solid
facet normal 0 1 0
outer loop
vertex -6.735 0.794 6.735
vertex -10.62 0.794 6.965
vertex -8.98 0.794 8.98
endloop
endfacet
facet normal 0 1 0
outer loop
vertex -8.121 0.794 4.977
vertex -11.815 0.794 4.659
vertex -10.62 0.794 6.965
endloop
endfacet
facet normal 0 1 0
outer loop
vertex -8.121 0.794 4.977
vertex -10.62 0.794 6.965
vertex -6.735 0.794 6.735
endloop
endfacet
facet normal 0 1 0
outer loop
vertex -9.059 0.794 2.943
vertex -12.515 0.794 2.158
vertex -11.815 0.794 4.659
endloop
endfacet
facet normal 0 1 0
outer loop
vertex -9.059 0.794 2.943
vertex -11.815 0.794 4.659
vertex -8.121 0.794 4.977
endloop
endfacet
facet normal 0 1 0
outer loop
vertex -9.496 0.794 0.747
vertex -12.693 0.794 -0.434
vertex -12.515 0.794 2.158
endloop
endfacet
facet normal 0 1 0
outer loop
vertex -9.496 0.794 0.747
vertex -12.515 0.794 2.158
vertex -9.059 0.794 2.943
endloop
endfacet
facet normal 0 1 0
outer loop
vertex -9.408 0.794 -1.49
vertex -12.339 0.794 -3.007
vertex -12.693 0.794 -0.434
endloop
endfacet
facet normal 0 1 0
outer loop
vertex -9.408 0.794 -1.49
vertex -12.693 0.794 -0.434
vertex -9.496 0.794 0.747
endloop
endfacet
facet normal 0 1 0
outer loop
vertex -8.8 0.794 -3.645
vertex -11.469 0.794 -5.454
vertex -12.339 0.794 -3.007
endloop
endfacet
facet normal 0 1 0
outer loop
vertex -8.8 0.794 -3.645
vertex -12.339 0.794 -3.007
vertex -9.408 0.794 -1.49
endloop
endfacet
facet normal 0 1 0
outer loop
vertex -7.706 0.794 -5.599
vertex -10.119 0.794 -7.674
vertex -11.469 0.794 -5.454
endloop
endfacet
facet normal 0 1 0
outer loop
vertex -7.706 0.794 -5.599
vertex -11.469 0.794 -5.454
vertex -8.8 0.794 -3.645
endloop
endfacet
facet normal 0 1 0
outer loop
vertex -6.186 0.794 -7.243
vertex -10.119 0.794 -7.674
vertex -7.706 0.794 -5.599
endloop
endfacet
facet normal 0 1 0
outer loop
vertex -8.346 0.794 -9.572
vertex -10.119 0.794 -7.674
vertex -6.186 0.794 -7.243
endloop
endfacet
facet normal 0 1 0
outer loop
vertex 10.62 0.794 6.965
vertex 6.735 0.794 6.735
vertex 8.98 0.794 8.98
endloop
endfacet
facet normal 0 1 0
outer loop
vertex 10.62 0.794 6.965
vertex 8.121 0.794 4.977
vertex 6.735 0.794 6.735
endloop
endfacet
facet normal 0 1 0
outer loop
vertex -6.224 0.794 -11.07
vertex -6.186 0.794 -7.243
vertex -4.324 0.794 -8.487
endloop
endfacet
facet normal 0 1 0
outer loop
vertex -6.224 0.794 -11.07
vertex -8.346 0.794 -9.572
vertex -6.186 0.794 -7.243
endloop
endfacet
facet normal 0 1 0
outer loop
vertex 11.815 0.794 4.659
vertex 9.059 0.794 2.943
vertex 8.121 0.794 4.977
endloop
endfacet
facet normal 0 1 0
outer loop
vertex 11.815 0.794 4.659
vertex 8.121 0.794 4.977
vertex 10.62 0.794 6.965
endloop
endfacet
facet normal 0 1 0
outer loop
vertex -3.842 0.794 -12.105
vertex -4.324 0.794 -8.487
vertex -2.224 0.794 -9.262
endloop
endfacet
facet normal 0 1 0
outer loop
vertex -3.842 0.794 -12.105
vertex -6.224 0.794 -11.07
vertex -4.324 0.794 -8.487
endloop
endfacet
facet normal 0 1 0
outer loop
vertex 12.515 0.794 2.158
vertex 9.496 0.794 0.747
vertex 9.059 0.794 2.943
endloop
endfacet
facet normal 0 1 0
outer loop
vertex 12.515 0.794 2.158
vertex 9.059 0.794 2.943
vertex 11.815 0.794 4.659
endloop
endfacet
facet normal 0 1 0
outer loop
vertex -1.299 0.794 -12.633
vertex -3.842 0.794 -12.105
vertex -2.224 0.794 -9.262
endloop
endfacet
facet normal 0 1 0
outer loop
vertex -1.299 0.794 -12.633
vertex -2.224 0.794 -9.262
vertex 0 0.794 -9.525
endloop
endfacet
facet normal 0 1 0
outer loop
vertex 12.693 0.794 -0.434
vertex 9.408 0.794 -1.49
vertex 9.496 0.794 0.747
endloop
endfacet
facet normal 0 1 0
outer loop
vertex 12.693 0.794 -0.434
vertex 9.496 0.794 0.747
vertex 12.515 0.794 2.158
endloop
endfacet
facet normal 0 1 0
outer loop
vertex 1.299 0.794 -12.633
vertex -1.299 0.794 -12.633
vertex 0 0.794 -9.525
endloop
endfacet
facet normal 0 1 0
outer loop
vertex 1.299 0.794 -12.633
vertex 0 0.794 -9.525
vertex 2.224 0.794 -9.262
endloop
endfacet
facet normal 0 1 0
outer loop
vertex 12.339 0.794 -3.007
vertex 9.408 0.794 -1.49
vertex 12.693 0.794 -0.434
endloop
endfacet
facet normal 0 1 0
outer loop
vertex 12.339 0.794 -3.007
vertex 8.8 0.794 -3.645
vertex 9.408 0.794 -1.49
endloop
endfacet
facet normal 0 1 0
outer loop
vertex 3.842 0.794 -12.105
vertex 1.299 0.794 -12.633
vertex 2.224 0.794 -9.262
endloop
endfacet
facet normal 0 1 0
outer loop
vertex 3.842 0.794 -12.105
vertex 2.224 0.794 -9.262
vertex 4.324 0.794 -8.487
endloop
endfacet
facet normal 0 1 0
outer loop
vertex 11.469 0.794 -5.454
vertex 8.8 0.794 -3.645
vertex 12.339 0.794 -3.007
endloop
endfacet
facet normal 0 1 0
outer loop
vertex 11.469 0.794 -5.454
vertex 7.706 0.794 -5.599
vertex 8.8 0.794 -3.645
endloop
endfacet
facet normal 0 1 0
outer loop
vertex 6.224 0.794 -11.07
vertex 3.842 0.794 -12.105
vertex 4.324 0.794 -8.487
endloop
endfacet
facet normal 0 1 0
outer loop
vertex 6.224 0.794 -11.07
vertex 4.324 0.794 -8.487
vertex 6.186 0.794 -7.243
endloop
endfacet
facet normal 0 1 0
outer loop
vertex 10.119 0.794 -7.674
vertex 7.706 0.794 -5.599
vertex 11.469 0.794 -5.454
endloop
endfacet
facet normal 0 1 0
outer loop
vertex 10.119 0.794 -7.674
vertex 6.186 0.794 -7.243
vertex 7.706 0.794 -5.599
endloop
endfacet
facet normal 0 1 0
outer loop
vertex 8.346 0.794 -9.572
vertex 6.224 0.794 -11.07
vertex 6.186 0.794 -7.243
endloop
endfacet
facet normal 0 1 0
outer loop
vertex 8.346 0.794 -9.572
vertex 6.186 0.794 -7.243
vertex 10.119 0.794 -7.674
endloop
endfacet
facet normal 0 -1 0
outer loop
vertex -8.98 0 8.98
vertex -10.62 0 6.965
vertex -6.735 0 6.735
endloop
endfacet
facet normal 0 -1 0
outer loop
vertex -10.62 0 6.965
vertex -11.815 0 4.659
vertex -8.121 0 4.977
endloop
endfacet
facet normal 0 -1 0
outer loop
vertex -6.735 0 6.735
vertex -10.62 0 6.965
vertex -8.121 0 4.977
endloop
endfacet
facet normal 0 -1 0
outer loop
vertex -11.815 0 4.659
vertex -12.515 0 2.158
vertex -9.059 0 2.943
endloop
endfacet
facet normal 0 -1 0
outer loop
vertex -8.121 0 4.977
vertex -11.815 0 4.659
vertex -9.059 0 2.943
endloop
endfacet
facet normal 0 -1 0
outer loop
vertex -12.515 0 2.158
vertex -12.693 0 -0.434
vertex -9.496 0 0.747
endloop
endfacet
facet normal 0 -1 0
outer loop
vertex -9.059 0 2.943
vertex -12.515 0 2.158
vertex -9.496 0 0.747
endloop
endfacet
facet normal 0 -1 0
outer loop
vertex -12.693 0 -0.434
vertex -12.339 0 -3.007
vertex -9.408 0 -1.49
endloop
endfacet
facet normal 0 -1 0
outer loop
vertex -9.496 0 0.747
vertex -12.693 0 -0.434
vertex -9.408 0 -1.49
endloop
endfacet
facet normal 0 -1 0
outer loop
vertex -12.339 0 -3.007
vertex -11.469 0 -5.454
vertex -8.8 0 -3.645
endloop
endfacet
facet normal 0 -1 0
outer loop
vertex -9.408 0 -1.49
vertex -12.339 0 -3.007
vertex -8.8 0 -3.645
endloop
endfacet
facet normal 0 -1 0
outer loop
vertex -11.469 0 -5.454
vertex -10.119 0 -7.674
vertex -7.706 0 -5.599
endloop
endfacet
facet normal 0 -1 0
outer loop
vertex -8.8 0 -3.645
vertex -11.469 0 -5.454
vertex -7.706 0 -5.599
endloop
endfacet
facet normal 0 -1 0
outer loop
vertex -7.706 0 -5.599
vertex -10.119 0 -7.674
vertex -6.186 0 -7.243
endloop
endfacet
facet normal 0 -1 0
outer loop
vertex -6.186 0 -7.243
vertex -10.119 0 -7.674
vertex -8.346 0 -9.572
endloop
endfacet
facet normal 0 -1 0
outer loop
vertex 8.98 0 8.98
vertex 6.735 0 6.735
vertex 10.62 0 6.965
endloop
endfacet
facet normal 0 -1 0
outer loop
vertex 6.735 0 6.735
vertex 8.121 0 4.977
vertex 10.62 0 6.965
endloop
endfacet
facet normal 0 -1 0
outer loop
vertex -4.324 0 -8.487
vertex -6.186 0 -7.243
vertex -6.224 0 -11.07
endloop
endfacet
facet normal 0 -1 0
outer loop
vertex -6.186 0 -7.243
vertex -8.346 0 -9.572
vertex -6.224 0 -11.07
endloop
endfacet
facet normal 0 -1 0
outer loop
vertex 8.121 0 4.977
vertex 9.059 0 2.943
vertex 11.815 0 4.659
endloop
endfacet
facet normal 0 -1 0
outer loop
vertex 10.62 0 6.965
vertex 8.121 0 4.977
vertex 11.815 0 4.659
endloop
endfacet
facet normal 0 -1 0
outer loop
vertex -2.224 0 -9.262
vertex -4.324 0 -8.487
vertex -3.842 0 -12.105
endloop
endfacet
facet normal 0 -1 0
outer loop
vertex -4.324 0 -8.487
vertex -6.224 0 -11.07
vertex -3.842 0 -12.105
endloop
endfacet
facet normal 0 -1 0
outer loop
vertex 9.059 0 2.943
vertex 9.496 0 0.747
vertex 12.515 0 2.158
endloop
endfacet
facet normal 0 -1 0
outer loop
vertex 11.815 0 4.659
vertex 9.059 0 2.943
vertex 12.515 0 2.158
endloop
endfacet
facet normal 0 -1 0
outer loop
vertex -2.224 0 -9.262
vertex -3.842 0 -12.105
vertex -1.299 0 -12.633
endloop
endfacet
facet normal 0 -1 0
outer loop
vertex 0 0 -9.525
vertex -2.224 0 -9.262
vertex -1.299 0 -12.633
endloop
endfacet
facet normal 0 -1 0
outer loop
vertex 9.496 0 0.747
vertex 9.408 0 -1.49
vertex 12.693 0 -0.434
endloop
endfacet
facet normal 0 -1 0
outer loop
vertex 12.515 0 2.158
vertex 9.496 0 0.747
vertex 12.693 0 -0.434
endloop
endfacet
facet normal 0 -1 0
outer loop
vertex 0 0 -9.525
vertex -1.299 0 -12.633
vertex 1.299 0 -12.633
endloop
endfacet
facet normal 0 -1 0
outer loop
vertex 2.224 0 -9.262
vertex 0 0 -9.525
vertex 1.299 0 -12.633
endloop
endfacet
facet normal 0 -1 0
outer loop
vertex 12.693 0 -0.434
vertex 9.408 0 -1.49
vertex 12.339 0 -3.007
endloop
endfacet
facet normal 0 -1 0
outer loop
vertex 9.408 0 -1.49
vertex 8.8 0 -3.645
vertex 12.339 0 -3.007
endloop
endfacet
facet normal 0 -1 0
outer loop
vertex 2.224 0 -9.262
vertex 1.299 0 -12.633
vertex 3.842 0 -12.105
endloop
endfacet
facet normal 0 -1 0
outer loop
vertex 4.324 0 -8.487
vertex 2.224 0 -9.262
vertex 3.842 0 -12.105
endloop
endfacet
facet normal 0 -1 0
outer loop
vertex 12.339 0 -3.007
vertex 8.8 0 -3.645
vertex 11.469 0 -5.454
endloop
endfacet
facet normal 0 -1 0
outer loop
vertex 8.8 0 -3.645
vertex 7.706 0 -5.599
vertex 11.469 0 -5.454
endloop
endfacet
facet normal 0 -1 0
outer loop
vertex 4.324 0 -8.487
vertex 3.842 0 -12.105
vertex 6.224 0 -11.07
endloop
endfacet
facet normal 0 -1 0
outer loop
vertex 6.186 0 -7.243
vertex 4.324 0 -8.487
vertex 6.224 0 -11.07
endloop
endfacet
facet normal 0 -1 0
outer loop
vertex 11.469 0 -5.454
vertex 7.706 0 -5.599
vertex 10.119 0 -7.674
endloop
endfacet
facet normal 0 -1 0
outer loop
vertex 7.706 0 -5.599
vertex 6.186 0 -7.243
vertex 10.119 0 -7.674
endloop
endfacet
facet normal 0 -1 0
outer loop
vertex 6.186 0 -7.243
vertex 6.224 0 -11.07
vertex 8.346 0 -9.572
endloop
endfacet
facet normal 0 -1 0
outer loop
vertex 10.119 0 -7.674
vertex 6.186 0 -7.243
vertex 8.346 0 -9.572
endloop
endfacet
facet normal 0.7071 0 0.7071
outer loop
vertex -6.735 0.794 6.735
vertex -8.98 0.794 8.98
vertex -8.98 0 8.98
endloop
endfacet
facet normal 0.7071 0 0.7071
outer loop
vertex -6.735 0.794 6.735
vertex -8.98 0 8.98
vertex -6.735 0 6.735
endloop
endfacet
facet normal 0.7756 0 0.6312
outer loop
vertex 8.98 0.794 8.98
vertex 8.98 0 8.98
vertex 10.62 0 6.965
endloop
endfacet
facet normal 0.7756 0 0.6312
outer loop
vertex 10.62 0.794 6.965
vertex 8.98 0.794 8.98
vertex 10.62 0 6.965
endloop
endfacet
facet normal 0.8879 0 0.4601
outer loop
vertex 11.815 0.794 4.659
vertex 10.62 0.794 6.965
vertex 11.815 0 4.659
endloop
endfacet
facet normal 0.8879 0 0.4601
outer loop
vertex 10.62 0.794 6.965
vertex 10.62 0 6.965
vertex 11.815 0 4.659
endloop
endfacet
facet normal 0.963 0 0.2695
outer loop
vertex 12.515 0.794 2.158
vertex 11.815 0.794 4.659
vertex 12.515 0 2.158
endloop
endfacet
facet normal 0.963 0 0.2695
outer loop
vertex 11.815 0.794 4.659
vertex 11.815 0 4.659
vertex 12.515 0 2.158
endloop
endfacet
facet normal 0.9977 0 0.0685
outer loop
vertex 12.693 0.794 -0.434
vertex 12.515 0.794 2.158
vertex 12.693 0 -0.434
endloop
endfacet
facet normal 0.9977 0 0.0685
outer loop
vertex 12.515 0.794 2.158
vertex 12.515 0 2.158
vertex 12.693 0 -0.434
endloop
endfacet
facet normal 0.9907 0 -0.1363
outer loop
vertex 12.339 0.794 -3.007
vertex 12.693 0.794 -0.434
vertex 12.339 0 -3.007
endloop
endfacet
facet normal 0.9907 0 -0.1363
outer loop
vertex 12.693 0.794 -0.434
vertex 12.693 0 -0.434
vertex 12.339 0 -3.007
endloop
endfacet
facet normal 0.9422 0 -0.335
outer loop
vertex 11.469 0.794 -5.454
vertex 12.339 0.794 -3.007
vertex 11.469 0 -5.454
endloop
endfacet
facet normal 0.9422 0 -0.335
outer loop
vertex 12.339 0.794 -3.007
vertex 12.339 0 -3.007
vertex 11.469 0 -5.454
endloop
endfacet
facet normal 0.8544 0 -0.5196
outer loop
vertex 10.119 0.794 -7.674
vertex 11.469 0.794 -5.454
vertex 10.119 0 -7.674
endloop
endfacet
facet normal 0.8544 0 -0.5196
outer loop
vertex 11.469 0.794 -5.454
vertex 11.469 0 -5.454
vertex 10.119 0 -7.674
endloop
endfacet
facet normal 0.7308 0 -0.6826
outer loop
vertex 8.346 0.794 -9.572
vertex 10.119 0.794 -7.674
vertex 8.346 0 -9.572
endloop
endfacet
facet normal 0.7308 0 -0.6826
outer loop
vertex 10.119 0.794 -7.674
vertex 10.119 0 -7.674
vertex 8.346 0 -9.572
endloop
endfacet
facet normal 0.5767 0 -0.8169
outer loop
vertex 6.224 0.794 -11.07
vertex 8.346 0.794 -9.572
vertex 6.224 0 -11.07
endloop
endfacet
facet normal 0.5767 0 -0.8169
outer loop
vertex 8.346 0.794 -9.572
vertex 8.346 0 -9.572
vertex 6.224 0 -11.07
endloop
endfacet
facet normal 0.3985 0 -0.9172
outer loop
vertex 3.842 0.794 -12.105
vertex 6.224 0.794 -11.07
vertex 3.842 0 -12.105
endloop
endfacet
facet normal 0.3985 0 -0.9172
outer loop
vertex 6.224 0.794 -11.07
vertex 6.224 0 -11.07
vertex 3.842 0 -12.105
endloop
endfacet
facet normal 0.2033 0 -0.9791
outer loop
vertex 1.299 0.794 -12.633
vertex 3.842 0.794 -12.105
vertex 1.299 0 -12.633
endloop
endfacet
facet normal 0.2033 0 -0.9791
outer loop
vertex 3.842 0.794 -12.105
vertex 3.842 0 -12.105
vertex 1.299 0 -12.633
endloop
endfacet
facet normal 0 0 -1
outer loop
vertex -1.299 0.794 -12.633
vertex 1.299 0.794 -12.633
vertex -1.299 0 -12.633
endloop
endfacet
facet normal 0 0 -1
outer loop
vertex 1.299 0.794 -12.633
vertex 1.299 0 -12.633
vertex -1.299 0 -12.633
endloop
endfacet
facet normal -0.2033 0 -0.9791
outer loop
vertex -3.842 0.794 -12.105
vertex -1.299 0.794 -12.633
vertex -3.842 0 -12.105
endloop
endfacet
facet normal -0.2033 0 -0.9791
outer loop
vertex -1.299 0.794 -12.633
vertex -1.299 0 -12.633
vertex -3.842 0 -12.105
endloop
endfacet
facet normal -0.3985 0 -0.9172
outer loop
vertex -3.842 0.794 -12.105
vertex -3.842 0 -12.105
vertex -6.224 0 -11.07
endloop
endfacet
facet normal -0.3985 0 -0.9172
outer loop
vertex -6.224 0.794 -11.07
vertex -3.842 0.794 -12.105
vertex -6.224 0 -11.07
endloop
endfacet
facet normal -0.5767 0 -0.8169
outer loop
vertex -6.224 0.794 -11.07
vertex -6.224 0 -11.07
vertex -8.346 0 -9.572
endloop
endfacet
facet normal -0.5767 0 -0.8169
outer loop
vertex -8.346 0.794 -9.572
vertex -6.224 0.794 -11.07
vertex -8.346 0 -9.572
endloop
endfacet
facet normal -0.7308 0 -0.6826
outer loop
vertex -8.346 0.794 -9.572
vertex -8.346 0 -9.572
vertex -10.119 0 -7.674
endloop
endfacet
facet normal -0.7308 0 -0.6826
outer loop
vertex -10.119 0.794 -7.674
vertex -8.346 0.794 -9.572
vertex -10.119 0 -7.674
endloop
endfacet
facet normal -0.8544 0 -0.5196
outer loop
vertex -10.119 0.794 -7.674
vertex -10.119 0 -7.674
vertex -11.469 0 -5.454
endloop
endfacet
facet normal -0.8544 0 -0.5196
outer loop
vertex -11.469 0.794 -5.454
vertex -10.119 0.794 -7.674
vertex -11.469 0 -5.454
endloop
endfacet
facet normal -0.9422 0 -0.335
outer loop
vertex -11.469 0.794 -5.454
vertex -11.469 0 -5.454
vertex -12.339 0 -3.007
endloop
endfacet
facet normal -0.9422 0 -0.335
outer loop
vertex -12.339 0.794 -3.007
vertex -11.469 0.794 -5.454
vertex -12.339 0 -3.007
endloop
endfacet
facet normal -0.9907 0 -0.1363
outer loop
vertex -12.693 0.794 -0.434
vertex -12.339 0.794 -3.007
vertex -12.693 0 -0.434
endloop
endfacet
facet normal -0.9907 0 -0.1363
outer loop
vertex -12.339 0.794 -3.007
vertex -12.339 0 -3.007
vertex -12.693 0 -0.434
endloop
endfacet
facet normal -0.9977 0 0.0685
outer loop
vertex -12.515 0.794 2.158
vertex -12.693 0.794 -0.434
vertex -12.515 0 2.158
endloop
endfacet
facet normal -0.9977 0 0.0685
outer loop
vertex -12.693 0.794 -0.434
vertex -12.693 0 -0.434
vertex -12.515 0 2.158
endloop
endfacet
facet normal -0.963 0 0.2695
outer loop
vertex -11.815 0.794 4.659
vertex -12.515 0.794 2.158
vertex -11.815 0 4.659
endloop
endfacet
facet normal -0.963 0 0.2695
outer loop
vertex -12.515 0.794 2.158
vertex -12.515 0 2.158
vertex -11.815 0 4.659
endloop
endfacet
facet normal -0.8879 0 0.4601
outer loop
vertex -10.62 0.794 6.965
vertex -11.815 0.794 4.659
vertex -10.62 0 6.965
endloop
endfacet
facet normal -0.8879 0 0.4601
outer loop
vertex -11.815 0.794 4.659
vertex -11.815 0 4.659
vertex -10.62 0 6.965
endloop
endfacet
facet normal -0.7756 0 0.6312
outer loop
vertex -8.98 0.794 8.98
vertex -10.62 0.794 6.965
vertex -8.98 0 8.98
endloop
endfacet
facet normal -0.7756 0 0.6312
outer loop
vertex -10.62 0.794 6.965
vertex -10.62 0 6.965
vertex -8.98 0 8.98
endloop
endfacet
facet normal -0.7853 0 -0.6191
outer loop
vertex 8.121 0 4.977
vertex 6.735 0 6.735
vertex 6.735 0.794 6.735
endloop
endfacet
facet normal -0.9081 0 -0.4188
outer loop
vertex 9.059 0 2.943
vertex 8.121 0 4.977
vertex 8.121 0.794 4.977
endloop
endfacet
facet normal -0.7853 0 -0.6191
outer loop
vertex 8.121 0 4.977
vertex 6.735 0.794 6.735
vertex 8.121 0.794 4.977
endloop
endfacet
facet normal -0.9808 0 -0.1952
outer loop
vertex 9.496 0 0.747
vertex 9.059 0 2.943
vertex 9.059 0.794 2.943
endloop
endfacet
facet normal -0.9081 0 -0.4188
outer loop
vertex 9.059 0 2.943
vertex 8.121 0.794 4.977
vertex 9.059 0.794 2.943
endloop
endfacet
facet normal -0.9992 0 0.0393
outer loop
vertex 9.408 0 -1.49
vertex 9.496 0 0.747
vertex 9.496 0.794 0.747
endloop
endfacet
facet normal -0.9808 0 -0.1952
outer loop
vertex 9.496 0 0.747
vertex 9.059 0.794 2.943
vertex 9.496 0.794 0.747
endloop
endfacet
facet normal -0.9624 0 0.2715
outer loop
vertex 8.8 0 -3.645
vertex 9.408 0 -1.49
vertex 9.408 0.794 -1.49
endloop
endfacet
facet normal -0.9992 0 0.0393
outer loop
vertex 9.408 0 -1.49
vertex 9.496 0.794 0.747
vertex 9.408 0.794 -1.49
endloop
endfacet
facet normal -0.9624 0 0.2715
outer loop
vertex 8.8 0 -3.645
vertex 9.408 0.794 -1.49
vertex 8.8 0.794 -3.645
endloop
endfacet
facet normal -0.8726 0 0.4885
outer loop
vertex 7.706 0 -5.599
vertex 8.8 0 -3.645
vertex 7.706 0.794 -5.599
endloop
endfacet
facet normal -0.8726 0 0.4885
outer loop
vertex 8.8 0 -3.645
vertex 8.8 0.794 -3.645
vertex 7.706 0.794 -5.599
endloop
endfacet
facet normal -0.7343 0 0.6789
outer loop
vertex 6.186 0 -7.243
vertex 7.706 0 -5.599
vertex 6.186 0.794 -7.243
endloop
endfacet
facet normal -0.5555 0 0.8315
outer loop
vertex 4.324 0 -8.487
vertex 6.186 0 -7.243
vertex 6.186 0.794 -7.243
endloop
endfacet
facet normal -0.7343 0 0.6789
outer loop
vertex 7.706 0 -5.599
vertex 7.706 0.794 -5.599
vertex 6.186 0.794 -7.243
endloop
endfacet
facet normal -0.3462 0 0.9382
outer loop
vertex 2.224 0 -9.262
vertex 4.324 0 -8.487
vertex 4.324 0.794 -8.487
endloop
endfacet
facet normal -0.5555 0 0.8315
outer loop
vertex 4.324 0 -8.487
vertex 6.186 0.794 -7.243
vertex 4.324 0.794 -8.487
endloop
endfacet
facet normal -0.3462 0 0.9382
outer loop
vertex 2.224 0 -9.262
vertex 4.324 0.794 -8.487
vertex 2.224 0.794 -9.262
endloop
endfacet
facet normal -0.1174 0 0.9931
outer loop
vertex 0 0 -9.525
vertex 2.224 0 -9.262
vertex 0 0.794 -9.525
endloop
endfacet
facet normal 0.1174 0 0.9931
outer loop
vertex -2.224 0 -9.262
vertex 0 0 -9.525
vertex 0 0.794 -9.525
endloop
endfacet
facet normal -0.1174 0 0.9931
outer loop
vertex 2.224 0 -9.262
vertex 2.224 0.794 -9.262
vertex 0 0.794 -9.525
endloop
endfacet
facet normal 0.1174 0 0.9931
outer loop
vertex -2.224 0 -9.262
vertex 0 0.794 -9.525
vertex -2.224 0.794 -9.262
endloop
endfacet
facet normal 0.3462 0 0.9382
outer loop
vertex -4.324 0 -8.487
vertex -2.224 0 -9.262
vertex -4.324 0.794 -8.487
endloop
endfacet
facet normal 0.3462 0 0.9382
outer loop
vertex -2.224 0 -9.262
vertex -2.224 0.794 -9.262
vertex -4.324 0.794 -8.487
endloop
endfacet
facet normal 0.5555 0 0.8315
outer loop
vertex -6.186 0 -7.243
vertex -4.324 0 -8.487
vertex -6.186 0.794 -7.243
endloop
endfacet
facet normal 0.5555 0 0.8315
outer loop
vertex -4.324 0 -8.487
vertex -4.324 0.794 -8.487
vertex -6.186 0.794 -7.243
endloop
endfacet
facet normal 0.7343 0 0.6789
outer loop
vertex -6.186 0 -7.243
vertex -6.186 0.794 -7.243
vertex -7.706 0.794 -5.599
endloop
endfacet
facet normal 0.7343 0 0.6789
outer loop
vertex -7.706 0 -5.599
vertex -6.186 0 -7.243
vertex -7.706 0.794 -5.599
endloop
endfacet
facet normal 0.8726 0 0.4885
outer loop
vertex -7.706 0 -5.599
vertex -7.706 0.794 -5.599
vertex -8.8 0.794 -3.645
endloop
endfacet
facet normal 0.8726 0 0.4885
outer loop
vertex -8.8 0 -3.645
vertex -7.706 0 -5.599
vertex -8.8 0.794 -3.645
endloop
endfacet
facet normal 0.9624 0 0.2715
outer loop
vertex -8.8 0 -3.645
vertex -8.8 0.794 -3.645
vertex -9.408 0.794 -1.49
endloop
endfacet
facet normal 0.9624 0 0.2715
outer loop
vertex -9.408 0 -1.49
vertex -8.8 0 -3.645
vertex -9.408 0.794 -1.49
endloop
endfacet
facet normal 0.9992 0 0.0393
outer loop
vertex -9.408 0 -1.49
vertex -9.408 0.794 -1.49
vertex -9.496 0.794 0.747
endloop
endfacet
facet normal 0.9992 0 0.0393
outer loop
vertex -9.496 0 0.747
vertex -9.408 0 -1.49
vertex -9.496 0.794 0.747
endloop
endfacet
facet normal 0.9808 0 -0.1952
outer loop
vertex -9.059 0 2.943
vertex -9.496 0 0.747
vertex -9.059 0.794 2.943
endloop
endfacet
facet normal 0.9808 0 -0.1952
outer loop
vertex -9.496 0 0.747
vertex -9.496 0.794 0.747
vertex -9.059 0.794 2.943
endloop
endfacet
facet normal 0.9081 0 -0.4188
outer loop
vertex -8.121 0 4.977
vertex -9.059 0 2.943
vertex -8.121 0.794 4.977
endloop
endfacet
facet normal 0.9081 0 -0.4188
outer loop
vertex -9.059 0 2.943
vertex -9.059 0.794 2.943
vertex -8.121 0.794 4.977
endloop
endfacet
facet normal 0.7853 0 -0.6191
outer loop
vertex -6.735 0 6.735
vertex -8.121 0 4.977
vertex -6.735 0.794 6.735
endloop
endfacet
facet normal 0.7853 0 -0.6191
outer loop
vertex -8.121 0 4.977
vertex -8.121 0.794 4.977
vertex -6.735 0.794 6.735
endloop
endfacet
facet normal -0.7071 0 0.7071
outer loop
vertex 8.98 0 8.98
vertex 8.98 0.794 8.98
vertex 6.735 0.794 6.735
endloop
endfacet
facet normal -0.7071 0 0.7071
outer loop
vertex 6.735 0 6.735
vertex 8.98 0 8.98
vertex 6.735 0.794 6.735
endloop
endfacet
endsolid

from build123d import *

# Parameters (mm, degrees)
SKETCH2_R                    = 12.7
BOSS_EXTRUDE1_DEPTH          = 0.79375
SKETCH3_R                    = 9.525
CUT_EXTRUDE1_DEPTH           = 1.79375
SKETCH4_W                    = 22.318168974
SKETCH4_H                    = 8.357131245
CUT_REVOLVE1_ANGLE           = 45
CUT_REVOLVE1_OTHER_WAY_ANGLE = 45


with BuildPart() as part:
    # Sketch2 → Boss-Extrude1 (new body)
    with BuildSketch(Plane(origin=(0, 0, 0), x_dir=(1, 0, 0), z_dir=(0, 1, 0))):
        Circle(SKETCH2_R)
    extrude(amount=BOSS_EXTRUDE1_DEPTH)

    # Sketch3 → Cut-Extrude1 (cut, through all)
    with BuildSketch(Plane(origin=(0, 0.79375, 0), x_dir=(1, 0, 0), z_dir=(0, 1, 0))):
        Circle(SKETCH3_R)
    extrude(amount=-CUT_EXTRUDE1_DEPTH, mode=Mode.SUBTRACT)

    # Sketch4 → Cut-Revolve1 (revolve, cut)
    with BuildSketch(Plane(origin=(0, 0, 0), x_dir=(0, 0, -1), z_dir=(1, 0, 0))):
        with Locations((-11.159084487, 3.258563731)):
            Rectangle(SKETCH4_W, SKETCH4_H)
    revolve(axis=Axis((0, -0.920001892, 0), (0, 1, 0)), revolution_arc=CUT_REVOLVE1_ANGLE, mode=Mode.SUBTRACT)

    # Sketch4 → Cut-Revolve1 other way (revolve, cut)
    with BuildSketch(Plane(origin=(0, 0, 0), x_dir=(0, 0, -1), z_dir=(1, 0, 0))):
        with Locations((-11.159084487, 3.258563731)):
            Rectangle(SKETCH4_W, SKETCH4_H)
    revolve(axis=Axis((0, -0.920001892, 0), (0, -1, 0)), revolution_arc=CUT_REVOLVE1_OTHER_WAY_ANGLE, mode=Mode.SUBTRACT)


solid = part.part
